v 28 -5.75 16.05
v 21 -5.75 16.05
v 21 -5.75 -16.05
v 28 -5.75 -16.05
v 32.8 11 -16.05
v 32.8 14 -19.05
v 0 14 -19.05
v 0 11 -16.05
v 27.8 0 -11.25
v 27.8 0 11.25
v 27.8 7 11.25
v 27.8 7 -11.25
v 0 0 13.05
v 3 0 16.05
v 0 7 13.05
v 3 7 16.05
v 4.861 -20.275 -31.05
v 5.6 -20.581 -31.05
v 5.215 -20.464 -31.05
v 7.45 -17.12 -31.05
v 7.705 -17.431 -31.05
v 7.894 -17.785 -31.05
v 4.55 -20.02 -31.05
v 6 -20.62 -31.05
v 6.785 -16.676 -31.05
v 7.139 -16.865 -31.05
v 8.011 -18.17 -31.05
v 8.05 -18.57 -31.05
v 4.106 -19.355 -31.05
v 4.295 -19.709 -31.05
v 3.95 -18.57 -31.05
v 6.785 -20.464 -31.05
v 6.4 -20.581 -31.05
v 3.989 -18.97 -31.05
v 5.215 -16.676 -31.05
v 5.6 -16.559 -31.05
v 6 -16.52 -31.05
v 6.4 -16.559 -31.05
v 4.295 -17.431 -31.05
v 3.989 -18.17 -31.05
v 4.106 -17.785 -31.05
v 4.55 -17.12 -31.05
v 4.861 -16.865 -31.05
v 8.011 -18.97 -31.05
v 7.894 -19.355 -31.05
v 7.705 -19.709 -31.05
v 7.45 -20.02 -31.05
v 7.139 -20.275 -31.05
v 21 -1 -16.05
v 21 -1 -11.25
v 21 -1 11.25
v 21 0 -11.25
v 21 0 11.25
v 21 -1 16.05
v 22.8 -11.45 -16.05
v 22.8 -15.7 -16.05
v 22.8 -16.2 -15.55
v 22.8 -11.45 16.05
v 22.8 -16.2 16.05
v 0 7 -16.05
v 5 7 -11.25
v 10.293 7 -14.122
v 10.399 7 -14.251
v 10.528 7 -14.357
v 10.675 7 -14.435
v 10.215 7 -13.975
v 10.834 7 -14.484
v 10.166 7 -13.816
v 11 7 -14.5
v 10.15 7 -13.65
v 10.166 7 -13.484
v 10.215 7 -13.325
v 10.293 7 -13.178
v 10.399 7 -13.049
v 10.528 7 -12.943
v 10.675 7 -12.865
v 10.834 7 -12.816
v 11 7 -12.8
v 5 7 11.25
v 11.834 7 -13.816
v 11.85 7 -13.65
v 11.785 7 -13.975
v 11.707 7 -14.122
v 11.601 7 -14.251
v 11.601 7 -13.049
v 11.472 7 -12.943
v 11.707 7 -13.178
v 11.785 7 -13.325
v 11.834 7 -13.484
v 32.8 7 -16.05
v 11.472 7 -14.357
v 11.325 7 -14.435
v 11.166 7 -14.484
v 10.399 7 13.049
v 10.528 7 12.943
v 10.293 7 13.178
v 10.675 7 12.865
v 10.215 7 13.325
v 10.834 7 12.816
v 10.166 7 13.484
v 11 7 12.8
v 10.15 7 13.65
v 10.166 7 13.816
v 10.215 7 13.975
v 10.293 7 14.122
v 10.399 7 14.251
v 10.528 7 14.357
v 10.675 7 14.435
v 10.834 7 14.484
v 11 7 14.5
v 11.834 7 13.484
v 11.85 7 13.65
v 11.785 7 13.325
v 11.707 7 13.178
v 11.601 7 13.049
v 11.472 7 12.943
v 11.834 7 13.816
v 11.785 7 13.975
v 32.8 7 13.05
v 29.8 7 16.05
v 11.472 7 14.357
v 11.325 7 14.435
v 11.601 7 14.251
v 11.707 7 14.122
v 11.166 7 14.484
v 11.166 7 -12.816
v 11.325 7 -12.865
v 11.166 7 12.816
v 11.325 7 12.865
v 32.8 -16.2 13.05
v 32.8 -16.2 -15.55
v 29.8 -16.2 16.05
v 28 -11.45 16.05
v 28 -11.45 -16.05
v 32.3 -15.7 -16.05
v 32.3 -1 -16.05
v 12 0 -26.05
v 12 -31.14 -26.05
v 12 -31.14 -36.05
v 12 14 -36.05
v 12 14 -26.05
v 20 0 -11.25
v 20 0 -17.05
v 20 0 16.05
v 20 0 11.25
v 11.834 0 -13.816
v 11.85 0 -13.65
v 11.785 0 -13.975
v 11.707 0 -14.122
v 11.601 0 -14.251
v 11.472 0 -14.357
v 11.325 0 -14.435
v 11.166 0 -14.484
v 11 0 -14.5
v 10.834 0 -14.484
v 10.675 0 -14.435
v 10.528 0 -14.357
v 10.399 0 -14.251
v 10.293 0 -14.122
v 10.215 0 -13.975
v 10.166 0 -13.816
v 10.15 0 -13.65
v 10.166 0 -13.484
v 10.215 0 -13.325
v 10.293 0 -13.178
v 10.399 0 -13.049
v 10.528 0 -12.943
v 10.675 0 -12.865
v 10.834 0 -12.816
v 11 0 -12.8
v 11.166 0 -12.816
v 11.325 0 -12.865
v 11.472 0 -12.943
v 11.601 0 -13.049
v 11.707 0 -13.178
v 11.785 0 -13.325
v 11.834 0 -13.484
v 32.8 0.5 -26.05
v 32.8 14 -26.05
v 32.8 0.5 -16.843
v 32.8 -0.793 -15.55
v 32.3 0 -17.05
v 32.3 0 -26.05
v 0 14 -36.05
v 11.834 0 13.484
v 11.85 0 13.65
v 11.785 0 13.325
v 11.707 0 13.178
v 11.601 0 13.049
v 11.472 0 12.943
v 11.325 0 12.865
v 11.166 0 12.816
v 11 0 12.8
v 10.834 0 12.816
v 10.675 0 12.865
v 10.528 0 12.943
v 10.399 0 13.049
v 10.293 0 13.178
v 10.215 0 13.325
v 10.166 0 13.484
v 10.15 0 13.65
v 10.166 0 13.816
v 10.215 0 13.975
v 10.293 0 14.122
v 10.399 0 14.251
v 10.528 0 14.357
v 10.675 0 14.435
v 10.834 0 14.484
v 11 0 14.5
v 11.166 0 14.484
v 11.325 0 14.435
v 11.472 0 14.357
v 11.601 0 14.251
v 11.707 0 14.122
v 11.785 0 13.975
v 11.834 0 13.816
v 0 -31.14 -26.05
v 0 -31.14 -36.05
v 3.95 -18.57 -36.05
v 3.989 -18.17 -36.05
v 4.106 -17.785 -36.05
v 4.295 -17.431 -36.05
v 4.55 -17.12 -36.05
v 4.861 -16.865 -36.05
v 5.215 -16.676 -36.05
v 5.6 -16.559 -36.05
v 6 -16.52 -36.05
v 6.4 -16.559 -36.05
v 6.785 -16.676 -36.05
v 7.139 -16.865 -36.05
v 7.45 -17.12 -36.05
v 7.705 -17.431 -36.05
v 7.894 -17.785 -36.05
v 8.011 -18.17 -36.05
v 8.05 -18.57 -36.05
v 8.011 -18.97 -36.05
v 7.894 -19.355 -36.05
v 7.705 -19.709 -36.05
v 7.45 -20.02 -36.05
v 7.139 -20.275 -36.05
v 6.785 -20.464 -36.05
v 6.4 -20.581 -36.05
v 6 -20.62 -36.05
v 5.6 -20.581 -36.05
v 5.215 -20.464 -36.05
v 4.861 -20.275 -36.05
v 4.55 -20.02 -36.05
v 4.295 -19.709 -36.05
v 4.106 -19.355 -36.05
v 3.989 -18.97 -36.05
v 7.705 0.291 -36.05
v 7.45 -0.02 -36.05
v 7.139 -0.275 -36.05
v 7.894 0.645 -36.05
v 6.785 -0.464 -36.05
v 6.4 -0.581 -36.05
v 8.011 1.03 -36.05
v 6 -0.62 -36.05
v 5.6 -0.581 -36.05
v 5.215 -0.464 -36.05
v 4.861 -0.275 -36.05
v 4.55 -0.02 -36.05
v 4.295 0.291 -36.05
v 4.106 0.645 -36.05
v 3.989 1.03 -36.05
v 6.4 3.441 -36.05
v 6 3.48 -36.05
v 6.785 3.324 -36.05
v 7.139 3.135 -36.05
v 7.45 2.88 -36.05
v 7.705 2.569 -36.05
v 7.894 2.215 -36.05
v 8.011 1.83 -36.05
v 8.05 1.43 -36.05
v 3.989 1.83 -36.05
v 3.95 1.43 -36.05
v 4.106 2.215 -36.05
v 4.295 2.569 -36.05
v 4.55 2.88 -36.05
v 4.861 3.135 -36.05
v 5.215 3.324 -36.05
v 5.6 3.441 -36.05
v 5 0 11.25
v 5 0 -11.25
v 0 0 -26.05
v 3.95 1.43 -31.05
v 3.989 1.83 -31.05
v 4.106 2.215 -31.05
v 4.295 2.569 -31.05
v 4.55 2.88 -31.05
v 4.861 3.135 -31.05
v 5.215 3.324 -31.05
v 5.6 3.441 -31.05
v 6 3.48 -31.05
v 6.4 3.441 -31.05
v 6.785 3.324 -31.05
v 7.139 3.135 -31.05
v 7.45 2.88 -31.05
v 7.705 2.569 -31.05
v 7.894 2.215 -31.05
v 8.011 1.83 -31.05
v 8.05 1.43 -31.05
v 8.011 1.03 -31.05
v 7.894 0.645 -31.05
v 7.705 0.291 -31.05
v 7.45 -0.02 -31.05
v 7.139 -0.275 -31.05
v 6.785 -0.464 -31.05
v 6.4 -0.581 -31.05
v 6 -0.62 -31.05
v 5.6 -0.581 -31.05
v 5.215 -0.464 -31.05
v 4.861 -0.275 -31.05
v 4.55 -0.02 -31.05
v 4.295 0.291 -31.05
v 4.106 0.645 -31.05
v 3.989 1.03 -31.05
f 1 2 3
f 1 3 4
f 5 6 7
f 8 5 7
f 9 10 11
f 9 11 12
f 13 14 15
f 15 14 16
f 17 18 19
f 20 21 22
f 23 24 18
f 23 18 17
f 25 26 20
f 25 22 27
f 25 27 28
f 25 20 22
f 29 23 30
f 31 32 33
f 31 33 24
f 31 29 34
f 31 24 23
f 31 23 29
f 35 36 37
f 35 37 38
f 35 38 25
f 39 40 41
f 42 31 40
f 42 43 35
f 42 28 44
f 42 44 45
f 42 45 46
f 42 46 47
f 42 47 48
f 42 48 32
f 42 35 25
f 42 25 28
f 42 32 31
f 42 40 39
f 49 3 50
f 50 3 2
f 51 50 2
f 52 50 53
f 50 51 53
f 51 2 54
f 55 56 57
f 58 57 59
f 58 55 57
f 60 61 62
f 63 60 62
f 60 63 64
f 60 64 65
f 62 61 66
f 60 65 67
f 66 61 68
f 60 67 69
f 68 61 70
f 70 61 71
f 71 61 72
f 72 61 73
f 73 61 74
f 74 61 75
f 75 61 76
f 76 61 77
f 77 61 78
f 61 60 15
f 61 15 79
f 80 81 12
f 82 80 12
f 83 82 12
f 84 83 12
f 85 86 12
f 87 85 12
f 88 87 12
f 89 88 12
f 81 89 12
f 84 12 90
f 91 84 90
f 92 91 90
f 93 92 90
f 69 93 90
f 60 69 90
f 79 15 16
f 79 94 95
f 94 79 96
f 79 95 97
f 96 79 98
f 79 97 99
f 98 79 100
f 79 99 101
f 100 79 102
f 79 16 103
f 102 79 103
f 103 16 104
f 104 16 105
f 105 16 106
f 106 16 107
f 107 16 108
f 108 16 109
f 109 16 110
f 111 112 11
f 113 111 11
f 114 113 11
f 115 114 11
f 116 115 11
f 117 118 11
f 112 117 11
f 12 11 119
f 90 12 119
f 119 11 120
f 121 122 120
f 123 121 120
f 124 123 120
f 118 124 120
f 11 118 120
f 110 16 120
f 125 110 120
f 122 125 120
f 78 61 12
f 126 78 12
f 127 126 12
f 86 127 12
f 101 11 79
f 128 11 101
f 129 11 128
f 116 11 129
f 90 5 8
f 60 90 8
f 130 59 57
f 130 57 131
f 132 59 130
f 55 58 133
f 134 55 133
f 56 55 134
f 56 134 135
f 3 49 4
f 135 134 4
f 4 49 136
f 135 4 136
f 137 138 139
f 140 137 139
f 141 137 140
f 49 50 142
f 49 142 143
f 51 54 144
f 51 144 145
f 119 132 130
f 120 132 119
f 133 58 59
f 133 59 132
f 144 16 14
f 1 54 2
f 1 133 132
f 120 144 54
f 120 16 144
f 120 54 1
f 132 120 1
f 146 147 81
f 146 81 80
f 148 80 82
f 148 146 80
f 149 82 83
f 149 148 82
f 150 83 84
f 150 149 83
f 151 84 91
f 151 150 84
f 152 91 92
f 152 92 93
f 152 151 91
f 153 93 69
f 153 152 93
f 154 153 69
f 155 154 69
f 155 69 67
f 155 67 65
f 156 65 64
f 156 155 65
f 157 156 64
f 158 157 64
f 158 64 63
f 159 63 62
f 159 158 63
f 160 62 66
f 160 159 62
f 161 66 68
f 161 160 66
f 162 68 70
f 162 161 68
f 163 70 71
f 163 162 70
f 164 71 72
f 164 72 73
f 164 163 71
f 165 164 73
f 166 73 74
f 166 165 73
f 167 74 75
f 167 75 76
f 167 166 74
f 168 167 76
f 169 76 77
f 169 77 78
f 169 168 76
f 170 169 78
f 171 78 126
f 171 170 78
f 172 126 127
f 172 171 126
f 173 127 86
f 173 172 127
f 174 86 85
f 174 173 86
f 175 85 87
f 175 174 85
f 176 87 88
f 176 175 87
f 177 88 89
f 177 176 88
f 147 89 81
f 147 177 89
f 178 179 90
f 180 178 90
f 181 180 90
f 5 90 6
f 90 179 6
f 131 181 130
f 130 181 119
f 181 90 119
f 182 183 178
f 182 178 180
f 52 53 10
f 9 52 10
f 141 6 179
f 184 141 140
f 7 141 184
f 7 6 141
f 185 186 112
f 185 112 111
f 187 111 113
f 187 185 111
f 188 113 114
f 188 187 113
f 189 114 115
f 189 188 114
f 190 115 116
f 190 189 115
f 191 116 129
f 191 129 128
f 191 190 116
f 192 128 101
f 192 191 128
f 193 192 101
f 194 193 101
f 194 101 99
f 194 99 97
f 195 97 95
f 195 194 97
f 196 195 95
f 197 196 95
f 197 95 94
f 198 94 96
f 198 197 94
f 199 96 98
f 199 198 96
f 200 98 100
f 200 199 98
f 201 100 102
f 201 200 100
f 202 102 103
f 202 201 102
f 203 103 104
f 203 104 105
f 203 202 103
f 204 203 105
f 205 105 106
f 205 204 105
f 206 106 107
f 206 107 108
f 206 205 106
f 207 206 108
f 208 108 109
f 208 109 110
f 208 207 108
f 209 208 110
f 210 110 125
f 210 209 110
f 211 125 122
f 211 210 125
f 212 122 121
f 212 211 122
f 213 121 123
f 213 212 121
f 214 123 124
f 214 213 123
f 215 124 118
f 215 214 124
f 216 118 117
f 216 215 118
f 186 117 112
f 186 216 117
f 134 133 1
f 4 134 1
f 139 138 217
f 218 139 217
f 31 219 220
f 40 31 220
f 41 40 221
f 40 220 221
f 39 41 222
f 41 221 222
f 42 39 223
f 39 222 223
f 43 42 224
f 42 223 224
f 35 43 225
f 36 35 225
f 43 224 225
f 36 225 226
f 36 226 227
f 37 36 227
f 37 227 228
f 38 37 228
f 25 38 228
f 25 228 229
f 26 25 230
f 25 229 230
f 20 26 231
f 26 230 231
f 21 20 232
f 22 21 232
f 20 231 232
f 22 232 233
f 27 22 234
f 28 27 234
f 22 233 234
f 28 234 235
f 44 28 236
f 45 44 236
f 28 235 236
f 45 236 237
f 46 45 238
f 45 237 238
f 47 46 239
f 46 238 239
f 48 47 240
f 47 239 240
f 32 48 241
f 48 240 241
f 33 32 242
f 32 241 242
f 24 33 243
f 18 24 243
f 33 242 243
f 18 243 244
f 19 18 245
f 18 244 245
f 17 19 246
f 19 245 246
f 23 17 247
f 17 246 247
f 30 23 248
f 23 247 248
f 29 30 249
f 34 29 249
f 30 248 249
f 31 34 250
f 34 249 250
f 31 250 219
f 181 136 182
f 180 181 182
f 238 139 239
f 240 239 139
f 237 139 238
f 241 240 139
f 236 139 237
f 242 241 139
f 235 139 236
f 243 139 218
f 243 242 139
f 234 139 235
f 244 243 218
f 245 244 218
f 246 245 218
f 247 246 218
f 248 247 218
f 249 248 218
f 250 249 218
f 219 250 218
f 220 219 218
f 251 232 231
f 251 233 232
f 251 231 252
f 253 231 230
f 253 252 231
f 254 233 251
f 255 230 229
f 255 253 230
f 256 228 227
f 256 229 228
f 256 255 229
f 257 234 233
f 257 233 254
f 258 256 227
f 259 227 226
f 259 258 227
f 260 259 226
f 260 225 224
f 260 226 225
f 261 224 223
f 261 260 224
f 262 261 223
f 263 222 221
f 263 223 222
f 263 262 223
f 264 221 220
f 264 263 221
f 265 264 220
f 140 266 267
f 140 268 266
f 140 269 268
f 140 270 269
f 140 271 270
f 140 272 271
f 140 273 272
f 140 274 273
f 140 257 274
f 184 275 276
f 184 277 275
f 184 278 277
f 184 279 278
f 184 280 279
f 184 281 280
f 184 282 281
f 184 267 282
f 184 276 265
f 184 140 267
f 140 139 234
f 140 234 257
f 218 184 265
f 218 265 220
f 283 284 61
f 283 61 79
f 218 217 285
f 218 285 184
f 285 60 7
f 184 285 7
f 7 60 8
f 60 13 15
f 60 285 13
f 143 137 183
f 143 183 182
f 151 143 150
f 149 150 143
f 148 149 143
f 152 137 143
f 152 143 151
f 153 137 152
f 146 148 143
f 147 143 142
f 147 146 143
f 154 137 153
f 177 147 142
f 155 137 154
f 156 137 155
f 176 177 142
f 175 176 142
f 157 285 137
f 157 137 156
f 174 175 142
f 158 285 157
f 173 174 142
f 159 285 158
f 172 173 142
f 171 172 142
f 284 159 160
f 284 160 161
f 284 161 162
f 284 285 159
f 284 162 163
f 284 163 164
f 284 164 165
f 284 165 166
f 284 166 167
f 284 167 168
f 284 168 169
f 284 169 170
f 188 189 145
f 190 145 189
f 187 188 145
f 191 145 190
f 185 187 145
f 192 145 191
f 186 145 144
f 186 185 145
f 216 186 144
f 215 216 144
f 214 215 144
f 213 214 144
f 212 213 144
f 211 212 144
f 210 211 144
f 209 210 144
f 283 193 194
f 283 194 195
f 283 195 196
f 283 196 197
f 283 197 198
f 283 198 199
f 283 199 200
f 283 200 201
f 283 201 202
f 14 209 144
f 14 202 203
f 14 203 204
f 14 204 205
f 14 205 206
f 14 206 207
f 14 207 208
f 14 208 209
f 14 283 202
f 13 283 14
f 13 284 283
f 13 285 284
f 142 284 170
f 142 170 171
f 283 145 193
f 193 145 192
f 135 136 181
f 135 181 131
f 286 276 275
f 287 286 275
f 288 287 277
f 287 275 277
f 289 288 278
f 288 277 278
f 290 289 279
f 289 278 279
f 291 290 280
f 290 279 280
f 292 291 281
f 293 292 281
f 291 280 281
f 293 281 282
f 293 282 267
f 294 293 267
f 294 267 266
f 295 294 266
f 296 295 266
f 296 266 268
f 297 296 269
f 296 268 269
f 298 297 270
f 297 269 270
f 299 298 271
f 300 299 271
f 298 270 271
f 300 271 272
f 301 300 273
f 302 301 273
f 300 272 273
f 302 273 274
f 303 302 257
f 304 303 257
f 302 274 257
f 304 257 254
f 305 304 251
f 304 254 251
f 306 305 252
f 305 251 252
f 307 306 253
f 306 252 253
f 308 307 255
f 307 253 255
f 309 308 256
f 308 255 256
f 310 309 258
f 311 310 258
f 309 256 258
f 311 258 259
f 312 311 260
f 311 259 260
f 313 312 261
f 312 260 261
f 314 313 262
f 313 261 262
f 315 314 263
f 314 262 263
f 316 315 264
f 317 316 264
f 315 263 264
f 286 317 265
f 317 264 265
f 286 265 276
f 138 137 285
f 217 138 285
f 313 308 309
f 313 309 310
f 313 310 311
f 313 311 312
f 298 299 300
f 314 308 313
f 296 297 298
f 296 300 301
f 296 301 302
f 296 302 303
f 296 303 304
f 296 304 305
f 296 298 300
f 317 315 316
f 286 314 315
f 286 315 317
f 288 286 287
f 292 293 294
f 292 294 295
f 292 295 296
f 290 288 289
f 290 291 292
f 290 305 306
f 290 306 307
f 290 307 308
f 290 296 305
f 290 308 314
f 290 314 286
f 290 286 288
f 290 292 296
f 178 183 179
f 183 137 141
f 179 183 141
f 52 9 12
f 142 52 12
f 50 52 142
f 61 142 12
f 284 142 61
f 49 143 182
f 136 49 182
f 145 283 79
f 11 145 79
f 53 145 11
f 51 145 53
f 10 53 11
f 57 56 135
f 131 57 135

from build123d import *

# Parameters (mm, degrees)
SKETCH1_R                = 0.85
BOSS_EXTRUDE1_DEPTH      = 7
BOSS_EXTRUDE2_DEPTH      = 11.2
BOSS_EXTRUDE2_DEPTH_BACK = 7
SKETCH3_W                = 11
SKETCH3_H                = 11.2
CUT_EXTRUDE1_DEPTH       = 42
SKETCH4_W                = 10
SKETCH4_H                = 32.1
BOSS_EXTRUDE3_DEPTH      = 5
SKETCH5_W                = 7
SKETCH5_H                = 6
BOSS_EXTRUDE4_DEPTH      = 32.1
SKETCH6_W                = 32.8
SKETCH6_H                = 7
BOSS_EXTRUDE5_DEPTH      = 10
SKETCH8_W                = 10
SKETCH8_H                = 7
BOSS_EXTRUDE7_DEPTH      = 32.8
CHAMFER2_SIZE            = 1
CHAMFER3_SIZE            = 3
CHAMFER4_SIZE            = 3
CHAMFER8_SIZE            = 0.5
CHAMFER9_SIZE            = 1
SKETCH13_W               = 12
SKETCH13_H               = 45.14
BOSS_EXTRUDE10_DEPTH     = 10
SKETCH14_R               = 2.05
CUT_EXTRUDE2_DEPTH       = 5
SKETCH15_W               = 7
SKETCH15_H               = 0.25
CUT_EXTRUDE3_DEPTH       = 39


with BuildPart() as part:
    # Sketch1 → Boss-Extrude1 (new body)
    with BuildSketch(Plane(origin=(0, 0, 0), x_dir=(1, 0, 0), z_dir=(0, 1, 0))):
        Polygon((0, -16.05), (0, 16.05), (17, 16.05), (17, 11.25), (5, 11.25), (5, -11.25), (17, -11.25), (17, -16.05), align=None)
        with Locations((11, 13.65)):
            Circle(SKETCH1_R, mode=Mode.SUBTRACT)
        with Locations((11, -13.65)):
            Circle(SKETCH1_R, mode=Mode.SUBTRACT)
    extrude(amount=BOSS_EXTRUDE1_DEPTH)

    # Sketch2 → Boss-Extrude2 (add, two sides)
    with BuildSketch(Plane.XZ) as boss_extrude2_sk:
        Polygon((17, 11.25), (27.8, 11.25), (27.8, -11.25), (17, -11.25), (17, -16.05), (32.8, -16.05), (32.8, 16.05), (17, 16.05), align=None)
    extrude(amount=BOSS_EXTRUDE2_DEPTH)
    extrude(boss_extrude2_sk.sketch, amount=-BOSS_EXTRUDE2_DEPTH_BACK)

    # Sketch3 → Cut-Extrude1 (cut)
    with BuildSketch(Plane.XY.offset(16.05)):
        with Locations((22.5, -5.6)):
            Rectangle(SKETCH3_W, SKETCH3_H)
    extrude(amount=-CUT_EXTRUDE1_DEPTH, mode=Mode.SUBTRACT)

    # Sketch4 → Boss-Extrude3 (add)
    with BuildSketch(Plane.XZ.offset(11.2)):
        with Locations((27.8, 0)):
            Rectangle(SKETCH4_W, SKETCH4_H)
    extrude(amount=BOSS_EXTRUDE3_DEPTH)

    # Sketch5 → Boss-Extrude4 (add)
    with BuildSketch(Plane.XY.offset(16.05)):
        with Locations((24.5, -3)):
            Rectangle(SKETCH5_W, SKETCH5_H)
    extrude(amount=-BOSS_EXTRUDE4_DEPTH)



with BuildPart() as body_2:
    # Sketch6 → Boss-Extrude5 (new body)
    with BuildSketch(Plane(origin=(0, 0, -16.05), x_dir=(-1, 0, 0), z_dir=(0, 0, -1))):
        with Locations((-16.4, 10.5)):
            Rectangle(SKETCH6_W, SKETCH6_H)
    extrude(amount=BOSS_EXTRUDE5_DEPTH)


with BuildPart() as part_1:
    add(part.part)

    add(body_2.part)  # Boss-Extrude7 merges body 2
    # Sketch8 → Boss-Extrude7 (add)
    with BuildSketch(Plane.ZY):
        with Locations((-21.05, 3.5)):
            Rectangle(SKETCH8_W, SKETCH8_H)
    extrude(amount=-BOSS_EXTRUDE7_DEPTH)

    # Chamfer2
    chamfer2_edges = [part_1.edges().sort_by_distance(p)[0] for p in [
        (26.9, 0, -16.05),
    ]]
    chamfer(chamfer2_edges, length=CHAMFER2_SIZE)

    # Chamfer3
    chamfer3_edges = [part_1.edges().sort_by_distance(p)[0] for p in [
        (0, 3.5, 16.05),
        (32.8, -4.6, 16.05),
    ]]
    chamfer(chamfer3_edges, length=CHAMFER3_SIZE)

    # Chamfer4
    chamfer4_edges = [part_1.edges().sort_by_distance(p)[0] for p in [
        (16.4, 14, -16.05),
    ]]
    chamfer(chamfer4_edges, length=CHAMFER4_SIZE)

    # Chamfer8
    chamfer8_edges = [part_1.edges().sort_by_distance(p)[0] for p in [
        (32.8, 0, -21.55),
        (32.8, -8.6, -16.05),
        (32.8, -0.5, -16.55),
        (27.8, -16.2, -16.05),
    ]]
    chamfer(chamfer8_edges, length=CHAMFER8_SIZE)

    # Chamfer9
    chamfer9_edges = [part_1.edges().sort_by_distance(p)[0] for p in [
        (21, 0, -13.65),
        (21, 0, 13.65),
    ]]
    chamfer(chamfer9_edges, length=CHAMFER9_SIZE)

    # Sketch13 → Boss-Extrude10 (add)
    with BuildSketch(Plane(origin=(0, 0, -26.05), x_dir=(-1, 0, 0), z_dir=(0, 0, -1))):
        with Locations((-6, -8.57)):
            Rectangle(SKETCH13_W, SKETCH13_H)
    extrude(amount=BOSS_EXTRUDE10_DEPTH)

    # Sketch14 → Cut-Extrude2 (cut)
    with BuildSketch(Plane(origin=(0, 0, -36.05), x_dir=(-1, 0, 0), z_dir=(0, 0, -1))):
        with Locations((-6, 1.43)):
            Circle(SKETCH14_R)
        with Locations((-6, -18.57)):
            Circle(SKETCH14_R)
    extrude(amount=-CUT_EXTRUDE2_DEPTH, mode=Mode.SUBTRACT)

    # Sketch15 → Cut-Extrude3 (cut)
    with BuildSketch(Plane.XY.offset(16.05)):
        with Locations((24.5, -11.325)):
            Rectangle(SKETCH15_W, SKETCH15_H)
        with Locations((24.5, -5.875)):
            Rectangle(SKETCH15_W, SKETCH15_H)
    extrude(amount=-CUT_EXTRUDE3_DEPTH, mode=Mode.SUBTRACT)


solid = part_1.part
